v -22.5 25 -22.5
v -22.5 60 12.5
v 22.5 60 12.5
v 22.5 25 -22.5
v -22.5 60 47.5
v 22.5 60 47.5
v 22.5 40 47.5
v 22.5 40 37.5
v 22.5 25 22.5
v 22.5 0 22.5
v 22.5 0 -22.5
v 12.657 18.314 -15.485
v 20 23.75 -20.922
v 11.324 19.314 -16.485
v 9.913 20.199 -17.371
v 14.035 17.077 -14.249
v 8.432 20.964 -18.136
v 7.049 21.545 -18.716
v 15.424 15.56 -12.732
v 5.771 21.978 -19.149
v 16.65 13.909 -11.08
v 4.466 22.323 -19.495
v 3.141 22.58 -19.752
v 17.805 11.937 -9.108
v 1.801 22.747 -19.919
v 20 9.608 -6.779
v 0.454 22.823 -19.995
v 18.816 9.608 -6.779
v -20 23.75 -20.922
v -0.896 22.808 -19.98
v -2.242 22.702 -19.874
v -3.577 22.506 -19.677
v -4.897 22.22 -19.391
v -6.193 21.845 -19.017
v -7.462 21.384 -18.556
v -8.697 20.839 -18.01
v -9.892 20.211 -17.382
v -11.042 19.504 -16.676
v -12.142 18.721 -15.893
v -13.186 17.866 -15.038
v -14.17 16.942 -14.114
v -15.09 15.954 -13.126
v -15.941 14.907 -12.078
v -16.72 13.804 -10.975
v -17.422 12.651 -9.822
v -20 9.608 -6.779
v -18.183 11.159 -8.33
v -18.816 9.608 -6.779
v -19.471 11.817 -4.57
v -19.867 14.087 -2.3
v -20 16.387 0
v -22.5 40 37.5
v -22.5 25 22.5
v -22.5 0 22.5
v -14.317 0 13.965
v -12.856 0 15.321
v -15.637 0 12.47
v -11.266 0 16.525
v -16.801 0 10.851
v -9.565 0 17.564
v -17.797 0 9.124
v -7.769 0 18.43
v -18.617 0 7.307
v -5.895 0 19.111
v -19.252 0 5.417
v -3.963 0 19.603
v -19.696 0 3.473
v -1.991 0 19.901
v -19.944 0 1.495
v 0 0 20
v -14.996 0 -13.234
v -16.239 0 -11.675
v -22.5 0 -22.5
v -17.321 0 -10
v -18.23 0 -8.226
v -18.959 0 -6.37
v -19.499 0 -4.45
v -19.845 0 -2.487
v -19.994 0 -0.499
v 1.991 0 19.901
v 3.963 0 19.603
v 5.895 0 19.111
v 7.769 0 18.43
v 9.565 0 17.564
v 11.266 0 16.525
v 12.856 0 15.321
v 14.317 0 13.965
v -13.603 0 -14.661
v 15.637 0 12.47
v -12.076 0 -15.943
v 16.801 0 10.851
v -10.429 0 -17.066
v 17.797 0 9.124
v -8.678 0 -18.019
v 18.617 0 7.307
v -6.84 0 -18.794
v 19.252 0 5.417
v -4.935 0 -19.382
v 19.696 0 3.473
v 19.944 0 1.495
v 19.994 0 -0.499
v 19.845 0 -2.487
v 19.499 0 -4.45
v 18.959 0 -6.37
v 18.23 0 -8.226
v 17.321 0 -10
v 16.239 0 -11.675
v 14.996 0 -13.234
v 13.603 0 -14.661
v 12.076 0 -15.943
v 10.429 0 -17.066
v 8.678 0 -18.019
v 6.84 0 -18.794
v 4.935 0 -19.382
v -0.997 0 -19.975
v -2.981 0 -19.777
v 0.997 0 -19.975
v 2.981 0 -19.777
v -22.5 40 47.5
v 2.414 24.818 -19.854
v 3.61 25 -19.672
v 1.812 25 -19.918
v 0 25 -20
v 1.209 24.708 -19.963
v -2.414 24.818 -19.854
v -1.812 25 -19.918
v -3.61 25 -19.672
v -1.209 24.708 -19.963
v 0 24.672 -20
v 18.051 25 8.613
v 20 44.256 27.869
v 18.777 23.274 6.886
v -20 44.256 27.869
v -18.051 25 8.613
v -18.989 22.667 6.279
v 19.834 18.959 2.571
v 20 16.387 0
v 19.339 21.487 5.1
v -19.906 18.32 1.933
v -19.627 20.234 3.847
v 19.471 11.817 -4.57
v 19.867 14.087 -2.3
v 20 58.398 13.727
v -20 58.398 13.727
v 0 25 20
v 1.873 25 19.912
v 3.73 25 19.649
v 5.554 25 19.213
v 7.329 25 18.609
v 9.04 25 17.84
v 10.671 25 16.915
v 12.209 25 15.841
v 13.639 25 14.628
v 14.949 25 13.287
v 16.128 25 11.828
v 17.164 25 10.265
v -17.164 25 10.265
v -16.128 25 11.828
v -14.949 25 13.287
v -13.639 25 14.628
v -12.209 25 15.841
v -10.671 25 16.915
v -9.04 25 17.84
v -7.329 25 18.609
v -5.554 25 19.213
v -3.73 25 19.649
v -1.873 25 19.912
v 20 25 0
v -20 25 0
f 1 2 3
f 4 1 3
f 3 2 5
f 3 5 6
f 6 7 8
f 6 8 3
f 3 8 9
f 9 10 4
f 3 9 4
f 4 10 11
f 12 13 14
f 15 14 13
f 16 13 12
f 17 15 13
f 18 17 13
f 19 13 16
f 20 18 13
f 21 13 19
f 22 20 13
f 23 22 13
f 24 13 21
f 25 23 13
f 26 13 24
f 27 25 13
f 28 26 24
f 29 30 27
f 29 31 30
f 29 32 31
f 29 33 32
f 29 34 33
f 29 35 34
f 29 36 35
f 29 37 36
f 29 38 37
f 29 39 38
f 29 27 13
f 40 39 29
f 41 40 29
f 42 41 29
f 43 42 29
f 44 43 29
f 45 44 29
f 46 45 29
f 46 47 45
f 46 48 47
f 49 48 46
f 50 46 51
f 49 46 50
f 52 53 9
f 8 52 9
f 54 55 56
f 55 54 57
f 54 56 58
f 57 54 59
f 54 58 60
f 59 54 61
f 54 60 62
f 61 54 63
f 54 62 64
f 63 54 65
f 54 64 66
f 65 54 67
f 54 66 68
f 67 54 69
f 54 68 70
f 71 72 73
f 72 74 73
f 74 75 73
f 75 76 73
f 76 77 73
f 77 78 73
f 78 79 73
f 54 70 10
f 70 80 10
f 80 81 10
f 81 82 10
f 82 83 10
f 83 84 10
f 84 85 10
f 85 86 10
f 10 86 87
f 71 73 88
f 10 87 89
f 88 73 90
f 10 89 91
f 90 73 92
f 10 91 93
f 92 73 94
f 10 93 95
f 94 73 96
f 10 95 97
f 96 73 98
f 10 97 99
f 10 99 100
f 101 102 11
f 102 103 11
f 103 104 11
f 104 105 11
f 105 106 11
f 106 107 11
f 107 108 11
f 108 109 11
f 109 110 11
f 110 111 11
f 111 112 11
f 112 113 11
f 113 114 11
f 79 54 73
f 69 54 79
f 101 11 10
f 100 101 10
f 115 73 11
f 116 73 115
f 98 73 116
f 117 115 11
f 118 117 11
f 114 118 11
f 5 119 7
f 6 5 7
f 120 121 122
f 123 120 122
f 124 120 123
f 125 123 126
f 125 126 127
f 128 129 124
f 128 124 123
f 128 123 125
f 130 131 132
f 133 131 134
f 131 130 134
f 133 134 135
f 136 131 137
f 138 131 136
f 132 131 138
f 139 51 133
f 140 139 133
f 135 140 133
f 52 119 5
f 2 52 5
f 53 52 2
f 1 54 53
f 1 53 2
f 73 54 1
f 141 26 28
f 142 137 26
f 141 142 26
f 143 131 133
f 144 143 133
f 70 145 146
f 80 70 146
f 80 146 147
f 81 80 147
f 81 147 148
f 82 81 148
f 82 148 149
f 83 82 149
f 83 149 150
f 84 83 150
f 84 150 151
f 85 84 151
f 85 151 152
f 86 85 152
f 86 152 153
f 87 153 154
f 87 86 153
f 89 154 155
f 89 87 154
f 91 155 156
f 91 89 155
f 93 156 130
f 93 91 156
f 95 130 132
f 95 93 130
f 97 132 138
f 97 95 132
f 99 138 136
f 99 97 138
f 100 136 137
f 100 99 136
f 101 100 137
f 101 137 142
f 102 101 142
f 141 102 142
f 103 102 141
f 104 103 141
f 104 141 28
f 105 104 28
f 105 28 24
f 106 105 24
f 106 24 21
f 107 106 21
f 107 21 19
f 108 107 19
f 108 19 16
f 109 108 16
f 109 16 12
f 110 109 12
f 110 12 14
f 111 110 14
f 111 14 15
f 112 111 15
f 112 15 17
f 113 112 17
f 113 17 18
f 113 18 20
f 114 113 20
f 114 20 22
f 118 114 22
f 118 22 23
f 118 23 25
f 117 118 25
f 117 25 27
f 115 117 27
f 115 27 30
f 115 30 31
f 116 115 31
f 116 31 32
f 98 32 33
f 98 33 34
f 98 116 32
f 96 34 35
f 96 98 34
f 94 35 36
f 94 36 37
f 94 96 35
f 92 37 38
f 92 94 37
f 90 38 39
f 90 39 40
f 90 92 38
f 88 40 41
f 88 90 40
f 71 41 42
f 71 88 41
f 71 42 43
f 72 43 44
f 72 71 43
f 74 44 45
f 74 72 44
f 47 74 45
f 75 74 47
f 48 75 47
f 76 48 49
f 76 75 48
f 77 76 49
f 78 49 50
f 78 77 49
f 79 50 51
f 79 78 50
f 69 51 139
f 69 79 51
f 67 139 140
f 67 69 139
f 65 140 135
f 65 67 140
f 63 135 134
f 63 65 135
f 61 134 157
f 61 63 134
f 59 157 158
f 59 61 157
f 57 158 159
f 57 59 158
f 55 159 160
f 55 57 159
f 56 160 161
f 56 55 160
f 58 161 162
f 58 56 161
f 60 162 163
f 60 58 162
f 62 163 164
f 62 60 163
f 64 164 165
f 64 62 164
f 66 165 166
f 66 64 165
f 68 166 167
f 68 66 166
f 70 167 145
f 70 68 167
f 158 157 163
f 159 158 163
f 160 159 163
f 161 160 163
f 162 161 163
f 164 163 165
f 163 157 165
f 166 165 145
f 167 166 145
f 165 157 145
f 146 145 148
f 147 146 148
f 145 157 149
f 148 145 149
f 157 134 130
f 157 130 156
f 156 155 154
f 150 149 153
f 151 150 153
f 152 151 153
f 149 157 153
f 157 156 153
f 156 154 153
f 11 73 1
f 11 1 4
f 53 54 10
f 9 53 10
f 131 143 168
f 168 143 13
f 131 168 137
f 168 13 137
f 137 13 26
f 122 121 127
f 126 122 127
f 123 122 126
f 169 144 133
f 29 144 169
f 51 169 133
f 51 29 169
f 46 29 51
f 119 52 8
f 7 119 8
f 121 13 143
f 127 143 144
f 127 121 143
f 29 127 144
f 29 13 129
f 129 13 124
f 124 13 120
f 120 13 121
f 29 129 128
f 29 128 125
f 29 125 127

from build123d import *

# Parameters (mm, degrees)
SKETCH1_W           = 45
SKETCH1_H           = 45
BOSS_EXTRUDE1_DEPTH = 40
SKETCH2_W           = 45
SKETCH2_H           = 70
BOSS_EXTRUDE2_DEPTH = 20
CHAMFER1_SIZE       = 15
CHAMFER2_SIZE       = 35
SKETCH3_R           = 20
CUT_EXTRUDE1_DEPTH  = 25
SKETCH4_W           = 40
SKETCH4_H           = 20
CUT_EXTRUDE2_DEPTH  = 49


with BuildPart() as part:
    # Sketch1 → Boss-Extrude1 (new body)
    with BuildSketch(Plane(origin=(0, 0, 0), x_dir=(1, 0, 0), z_dir=(0, 1, 0))):
        Rectangle(SKETCH1_W, SKETCH1_H)
    extrude(amount=BOSS_EXTRUDE1_DEPTH)

    # Sketch2 → Boss-Extrude2 (add)
    with BuildSketch(Plane(origin=(0, 40, 0), x_dir=(1, 0, 0), z_dir=(0, 1, 0))):
        with Locations((0, -12.5)):
            Rectangle(SKETCH2_W, SKETCH2_H)
    extrude(amount=BOSS_EXTRUDE2_DEPTH)

    # Chamfer1
    chamfer1_edges = [part.edges().sort_by_distance(p)[0] for p in [
        (0, 40, 22.5),
    ]]
    chamfer(chamfer1_edges, length=CHAMFER1_SIZE)

    # Chamfer2
    chamfer2_edges = [part.edges().sort_by_distance(p)[0] for p in [
        (0, 60, -22.5),
    ]]
    chamfer(chamfer2_edges, length=CHAMFER2_SIZE)

    # Sketch3 → Cut-Extrude1 (cut)
    with BuildSketch(Plane(origin=(0, 0, 0), x_dir=(1, 0, 0), z_dir=(0, 1, 0))):
        with Locations(Location((0, 0, 0), (0, 0, 270))):
            Circle(SKETCH3_R)
    extrude(amount=CUT_EXTRUDE1_DEPTH, mode=Mode.SUBTRACT)

    # Sketch4 → Cut-Extrude2 (cut)
    with BuildSketch(Plane(origin=(0, 1.414213562, 1.414213562), x_dir=(-1, 0, 0), z_dir=(0, 0.7071067811865476, 0.7071067811865476))):
        with Locations((0, -21.587572106)):
            Rectangle(SKETCH4_W, SKETCH4_H)
    extrude(amount=CUT_EXTRUDE2_DEPTH, mode=Mode.SUBTRACT)


solid = part.part
